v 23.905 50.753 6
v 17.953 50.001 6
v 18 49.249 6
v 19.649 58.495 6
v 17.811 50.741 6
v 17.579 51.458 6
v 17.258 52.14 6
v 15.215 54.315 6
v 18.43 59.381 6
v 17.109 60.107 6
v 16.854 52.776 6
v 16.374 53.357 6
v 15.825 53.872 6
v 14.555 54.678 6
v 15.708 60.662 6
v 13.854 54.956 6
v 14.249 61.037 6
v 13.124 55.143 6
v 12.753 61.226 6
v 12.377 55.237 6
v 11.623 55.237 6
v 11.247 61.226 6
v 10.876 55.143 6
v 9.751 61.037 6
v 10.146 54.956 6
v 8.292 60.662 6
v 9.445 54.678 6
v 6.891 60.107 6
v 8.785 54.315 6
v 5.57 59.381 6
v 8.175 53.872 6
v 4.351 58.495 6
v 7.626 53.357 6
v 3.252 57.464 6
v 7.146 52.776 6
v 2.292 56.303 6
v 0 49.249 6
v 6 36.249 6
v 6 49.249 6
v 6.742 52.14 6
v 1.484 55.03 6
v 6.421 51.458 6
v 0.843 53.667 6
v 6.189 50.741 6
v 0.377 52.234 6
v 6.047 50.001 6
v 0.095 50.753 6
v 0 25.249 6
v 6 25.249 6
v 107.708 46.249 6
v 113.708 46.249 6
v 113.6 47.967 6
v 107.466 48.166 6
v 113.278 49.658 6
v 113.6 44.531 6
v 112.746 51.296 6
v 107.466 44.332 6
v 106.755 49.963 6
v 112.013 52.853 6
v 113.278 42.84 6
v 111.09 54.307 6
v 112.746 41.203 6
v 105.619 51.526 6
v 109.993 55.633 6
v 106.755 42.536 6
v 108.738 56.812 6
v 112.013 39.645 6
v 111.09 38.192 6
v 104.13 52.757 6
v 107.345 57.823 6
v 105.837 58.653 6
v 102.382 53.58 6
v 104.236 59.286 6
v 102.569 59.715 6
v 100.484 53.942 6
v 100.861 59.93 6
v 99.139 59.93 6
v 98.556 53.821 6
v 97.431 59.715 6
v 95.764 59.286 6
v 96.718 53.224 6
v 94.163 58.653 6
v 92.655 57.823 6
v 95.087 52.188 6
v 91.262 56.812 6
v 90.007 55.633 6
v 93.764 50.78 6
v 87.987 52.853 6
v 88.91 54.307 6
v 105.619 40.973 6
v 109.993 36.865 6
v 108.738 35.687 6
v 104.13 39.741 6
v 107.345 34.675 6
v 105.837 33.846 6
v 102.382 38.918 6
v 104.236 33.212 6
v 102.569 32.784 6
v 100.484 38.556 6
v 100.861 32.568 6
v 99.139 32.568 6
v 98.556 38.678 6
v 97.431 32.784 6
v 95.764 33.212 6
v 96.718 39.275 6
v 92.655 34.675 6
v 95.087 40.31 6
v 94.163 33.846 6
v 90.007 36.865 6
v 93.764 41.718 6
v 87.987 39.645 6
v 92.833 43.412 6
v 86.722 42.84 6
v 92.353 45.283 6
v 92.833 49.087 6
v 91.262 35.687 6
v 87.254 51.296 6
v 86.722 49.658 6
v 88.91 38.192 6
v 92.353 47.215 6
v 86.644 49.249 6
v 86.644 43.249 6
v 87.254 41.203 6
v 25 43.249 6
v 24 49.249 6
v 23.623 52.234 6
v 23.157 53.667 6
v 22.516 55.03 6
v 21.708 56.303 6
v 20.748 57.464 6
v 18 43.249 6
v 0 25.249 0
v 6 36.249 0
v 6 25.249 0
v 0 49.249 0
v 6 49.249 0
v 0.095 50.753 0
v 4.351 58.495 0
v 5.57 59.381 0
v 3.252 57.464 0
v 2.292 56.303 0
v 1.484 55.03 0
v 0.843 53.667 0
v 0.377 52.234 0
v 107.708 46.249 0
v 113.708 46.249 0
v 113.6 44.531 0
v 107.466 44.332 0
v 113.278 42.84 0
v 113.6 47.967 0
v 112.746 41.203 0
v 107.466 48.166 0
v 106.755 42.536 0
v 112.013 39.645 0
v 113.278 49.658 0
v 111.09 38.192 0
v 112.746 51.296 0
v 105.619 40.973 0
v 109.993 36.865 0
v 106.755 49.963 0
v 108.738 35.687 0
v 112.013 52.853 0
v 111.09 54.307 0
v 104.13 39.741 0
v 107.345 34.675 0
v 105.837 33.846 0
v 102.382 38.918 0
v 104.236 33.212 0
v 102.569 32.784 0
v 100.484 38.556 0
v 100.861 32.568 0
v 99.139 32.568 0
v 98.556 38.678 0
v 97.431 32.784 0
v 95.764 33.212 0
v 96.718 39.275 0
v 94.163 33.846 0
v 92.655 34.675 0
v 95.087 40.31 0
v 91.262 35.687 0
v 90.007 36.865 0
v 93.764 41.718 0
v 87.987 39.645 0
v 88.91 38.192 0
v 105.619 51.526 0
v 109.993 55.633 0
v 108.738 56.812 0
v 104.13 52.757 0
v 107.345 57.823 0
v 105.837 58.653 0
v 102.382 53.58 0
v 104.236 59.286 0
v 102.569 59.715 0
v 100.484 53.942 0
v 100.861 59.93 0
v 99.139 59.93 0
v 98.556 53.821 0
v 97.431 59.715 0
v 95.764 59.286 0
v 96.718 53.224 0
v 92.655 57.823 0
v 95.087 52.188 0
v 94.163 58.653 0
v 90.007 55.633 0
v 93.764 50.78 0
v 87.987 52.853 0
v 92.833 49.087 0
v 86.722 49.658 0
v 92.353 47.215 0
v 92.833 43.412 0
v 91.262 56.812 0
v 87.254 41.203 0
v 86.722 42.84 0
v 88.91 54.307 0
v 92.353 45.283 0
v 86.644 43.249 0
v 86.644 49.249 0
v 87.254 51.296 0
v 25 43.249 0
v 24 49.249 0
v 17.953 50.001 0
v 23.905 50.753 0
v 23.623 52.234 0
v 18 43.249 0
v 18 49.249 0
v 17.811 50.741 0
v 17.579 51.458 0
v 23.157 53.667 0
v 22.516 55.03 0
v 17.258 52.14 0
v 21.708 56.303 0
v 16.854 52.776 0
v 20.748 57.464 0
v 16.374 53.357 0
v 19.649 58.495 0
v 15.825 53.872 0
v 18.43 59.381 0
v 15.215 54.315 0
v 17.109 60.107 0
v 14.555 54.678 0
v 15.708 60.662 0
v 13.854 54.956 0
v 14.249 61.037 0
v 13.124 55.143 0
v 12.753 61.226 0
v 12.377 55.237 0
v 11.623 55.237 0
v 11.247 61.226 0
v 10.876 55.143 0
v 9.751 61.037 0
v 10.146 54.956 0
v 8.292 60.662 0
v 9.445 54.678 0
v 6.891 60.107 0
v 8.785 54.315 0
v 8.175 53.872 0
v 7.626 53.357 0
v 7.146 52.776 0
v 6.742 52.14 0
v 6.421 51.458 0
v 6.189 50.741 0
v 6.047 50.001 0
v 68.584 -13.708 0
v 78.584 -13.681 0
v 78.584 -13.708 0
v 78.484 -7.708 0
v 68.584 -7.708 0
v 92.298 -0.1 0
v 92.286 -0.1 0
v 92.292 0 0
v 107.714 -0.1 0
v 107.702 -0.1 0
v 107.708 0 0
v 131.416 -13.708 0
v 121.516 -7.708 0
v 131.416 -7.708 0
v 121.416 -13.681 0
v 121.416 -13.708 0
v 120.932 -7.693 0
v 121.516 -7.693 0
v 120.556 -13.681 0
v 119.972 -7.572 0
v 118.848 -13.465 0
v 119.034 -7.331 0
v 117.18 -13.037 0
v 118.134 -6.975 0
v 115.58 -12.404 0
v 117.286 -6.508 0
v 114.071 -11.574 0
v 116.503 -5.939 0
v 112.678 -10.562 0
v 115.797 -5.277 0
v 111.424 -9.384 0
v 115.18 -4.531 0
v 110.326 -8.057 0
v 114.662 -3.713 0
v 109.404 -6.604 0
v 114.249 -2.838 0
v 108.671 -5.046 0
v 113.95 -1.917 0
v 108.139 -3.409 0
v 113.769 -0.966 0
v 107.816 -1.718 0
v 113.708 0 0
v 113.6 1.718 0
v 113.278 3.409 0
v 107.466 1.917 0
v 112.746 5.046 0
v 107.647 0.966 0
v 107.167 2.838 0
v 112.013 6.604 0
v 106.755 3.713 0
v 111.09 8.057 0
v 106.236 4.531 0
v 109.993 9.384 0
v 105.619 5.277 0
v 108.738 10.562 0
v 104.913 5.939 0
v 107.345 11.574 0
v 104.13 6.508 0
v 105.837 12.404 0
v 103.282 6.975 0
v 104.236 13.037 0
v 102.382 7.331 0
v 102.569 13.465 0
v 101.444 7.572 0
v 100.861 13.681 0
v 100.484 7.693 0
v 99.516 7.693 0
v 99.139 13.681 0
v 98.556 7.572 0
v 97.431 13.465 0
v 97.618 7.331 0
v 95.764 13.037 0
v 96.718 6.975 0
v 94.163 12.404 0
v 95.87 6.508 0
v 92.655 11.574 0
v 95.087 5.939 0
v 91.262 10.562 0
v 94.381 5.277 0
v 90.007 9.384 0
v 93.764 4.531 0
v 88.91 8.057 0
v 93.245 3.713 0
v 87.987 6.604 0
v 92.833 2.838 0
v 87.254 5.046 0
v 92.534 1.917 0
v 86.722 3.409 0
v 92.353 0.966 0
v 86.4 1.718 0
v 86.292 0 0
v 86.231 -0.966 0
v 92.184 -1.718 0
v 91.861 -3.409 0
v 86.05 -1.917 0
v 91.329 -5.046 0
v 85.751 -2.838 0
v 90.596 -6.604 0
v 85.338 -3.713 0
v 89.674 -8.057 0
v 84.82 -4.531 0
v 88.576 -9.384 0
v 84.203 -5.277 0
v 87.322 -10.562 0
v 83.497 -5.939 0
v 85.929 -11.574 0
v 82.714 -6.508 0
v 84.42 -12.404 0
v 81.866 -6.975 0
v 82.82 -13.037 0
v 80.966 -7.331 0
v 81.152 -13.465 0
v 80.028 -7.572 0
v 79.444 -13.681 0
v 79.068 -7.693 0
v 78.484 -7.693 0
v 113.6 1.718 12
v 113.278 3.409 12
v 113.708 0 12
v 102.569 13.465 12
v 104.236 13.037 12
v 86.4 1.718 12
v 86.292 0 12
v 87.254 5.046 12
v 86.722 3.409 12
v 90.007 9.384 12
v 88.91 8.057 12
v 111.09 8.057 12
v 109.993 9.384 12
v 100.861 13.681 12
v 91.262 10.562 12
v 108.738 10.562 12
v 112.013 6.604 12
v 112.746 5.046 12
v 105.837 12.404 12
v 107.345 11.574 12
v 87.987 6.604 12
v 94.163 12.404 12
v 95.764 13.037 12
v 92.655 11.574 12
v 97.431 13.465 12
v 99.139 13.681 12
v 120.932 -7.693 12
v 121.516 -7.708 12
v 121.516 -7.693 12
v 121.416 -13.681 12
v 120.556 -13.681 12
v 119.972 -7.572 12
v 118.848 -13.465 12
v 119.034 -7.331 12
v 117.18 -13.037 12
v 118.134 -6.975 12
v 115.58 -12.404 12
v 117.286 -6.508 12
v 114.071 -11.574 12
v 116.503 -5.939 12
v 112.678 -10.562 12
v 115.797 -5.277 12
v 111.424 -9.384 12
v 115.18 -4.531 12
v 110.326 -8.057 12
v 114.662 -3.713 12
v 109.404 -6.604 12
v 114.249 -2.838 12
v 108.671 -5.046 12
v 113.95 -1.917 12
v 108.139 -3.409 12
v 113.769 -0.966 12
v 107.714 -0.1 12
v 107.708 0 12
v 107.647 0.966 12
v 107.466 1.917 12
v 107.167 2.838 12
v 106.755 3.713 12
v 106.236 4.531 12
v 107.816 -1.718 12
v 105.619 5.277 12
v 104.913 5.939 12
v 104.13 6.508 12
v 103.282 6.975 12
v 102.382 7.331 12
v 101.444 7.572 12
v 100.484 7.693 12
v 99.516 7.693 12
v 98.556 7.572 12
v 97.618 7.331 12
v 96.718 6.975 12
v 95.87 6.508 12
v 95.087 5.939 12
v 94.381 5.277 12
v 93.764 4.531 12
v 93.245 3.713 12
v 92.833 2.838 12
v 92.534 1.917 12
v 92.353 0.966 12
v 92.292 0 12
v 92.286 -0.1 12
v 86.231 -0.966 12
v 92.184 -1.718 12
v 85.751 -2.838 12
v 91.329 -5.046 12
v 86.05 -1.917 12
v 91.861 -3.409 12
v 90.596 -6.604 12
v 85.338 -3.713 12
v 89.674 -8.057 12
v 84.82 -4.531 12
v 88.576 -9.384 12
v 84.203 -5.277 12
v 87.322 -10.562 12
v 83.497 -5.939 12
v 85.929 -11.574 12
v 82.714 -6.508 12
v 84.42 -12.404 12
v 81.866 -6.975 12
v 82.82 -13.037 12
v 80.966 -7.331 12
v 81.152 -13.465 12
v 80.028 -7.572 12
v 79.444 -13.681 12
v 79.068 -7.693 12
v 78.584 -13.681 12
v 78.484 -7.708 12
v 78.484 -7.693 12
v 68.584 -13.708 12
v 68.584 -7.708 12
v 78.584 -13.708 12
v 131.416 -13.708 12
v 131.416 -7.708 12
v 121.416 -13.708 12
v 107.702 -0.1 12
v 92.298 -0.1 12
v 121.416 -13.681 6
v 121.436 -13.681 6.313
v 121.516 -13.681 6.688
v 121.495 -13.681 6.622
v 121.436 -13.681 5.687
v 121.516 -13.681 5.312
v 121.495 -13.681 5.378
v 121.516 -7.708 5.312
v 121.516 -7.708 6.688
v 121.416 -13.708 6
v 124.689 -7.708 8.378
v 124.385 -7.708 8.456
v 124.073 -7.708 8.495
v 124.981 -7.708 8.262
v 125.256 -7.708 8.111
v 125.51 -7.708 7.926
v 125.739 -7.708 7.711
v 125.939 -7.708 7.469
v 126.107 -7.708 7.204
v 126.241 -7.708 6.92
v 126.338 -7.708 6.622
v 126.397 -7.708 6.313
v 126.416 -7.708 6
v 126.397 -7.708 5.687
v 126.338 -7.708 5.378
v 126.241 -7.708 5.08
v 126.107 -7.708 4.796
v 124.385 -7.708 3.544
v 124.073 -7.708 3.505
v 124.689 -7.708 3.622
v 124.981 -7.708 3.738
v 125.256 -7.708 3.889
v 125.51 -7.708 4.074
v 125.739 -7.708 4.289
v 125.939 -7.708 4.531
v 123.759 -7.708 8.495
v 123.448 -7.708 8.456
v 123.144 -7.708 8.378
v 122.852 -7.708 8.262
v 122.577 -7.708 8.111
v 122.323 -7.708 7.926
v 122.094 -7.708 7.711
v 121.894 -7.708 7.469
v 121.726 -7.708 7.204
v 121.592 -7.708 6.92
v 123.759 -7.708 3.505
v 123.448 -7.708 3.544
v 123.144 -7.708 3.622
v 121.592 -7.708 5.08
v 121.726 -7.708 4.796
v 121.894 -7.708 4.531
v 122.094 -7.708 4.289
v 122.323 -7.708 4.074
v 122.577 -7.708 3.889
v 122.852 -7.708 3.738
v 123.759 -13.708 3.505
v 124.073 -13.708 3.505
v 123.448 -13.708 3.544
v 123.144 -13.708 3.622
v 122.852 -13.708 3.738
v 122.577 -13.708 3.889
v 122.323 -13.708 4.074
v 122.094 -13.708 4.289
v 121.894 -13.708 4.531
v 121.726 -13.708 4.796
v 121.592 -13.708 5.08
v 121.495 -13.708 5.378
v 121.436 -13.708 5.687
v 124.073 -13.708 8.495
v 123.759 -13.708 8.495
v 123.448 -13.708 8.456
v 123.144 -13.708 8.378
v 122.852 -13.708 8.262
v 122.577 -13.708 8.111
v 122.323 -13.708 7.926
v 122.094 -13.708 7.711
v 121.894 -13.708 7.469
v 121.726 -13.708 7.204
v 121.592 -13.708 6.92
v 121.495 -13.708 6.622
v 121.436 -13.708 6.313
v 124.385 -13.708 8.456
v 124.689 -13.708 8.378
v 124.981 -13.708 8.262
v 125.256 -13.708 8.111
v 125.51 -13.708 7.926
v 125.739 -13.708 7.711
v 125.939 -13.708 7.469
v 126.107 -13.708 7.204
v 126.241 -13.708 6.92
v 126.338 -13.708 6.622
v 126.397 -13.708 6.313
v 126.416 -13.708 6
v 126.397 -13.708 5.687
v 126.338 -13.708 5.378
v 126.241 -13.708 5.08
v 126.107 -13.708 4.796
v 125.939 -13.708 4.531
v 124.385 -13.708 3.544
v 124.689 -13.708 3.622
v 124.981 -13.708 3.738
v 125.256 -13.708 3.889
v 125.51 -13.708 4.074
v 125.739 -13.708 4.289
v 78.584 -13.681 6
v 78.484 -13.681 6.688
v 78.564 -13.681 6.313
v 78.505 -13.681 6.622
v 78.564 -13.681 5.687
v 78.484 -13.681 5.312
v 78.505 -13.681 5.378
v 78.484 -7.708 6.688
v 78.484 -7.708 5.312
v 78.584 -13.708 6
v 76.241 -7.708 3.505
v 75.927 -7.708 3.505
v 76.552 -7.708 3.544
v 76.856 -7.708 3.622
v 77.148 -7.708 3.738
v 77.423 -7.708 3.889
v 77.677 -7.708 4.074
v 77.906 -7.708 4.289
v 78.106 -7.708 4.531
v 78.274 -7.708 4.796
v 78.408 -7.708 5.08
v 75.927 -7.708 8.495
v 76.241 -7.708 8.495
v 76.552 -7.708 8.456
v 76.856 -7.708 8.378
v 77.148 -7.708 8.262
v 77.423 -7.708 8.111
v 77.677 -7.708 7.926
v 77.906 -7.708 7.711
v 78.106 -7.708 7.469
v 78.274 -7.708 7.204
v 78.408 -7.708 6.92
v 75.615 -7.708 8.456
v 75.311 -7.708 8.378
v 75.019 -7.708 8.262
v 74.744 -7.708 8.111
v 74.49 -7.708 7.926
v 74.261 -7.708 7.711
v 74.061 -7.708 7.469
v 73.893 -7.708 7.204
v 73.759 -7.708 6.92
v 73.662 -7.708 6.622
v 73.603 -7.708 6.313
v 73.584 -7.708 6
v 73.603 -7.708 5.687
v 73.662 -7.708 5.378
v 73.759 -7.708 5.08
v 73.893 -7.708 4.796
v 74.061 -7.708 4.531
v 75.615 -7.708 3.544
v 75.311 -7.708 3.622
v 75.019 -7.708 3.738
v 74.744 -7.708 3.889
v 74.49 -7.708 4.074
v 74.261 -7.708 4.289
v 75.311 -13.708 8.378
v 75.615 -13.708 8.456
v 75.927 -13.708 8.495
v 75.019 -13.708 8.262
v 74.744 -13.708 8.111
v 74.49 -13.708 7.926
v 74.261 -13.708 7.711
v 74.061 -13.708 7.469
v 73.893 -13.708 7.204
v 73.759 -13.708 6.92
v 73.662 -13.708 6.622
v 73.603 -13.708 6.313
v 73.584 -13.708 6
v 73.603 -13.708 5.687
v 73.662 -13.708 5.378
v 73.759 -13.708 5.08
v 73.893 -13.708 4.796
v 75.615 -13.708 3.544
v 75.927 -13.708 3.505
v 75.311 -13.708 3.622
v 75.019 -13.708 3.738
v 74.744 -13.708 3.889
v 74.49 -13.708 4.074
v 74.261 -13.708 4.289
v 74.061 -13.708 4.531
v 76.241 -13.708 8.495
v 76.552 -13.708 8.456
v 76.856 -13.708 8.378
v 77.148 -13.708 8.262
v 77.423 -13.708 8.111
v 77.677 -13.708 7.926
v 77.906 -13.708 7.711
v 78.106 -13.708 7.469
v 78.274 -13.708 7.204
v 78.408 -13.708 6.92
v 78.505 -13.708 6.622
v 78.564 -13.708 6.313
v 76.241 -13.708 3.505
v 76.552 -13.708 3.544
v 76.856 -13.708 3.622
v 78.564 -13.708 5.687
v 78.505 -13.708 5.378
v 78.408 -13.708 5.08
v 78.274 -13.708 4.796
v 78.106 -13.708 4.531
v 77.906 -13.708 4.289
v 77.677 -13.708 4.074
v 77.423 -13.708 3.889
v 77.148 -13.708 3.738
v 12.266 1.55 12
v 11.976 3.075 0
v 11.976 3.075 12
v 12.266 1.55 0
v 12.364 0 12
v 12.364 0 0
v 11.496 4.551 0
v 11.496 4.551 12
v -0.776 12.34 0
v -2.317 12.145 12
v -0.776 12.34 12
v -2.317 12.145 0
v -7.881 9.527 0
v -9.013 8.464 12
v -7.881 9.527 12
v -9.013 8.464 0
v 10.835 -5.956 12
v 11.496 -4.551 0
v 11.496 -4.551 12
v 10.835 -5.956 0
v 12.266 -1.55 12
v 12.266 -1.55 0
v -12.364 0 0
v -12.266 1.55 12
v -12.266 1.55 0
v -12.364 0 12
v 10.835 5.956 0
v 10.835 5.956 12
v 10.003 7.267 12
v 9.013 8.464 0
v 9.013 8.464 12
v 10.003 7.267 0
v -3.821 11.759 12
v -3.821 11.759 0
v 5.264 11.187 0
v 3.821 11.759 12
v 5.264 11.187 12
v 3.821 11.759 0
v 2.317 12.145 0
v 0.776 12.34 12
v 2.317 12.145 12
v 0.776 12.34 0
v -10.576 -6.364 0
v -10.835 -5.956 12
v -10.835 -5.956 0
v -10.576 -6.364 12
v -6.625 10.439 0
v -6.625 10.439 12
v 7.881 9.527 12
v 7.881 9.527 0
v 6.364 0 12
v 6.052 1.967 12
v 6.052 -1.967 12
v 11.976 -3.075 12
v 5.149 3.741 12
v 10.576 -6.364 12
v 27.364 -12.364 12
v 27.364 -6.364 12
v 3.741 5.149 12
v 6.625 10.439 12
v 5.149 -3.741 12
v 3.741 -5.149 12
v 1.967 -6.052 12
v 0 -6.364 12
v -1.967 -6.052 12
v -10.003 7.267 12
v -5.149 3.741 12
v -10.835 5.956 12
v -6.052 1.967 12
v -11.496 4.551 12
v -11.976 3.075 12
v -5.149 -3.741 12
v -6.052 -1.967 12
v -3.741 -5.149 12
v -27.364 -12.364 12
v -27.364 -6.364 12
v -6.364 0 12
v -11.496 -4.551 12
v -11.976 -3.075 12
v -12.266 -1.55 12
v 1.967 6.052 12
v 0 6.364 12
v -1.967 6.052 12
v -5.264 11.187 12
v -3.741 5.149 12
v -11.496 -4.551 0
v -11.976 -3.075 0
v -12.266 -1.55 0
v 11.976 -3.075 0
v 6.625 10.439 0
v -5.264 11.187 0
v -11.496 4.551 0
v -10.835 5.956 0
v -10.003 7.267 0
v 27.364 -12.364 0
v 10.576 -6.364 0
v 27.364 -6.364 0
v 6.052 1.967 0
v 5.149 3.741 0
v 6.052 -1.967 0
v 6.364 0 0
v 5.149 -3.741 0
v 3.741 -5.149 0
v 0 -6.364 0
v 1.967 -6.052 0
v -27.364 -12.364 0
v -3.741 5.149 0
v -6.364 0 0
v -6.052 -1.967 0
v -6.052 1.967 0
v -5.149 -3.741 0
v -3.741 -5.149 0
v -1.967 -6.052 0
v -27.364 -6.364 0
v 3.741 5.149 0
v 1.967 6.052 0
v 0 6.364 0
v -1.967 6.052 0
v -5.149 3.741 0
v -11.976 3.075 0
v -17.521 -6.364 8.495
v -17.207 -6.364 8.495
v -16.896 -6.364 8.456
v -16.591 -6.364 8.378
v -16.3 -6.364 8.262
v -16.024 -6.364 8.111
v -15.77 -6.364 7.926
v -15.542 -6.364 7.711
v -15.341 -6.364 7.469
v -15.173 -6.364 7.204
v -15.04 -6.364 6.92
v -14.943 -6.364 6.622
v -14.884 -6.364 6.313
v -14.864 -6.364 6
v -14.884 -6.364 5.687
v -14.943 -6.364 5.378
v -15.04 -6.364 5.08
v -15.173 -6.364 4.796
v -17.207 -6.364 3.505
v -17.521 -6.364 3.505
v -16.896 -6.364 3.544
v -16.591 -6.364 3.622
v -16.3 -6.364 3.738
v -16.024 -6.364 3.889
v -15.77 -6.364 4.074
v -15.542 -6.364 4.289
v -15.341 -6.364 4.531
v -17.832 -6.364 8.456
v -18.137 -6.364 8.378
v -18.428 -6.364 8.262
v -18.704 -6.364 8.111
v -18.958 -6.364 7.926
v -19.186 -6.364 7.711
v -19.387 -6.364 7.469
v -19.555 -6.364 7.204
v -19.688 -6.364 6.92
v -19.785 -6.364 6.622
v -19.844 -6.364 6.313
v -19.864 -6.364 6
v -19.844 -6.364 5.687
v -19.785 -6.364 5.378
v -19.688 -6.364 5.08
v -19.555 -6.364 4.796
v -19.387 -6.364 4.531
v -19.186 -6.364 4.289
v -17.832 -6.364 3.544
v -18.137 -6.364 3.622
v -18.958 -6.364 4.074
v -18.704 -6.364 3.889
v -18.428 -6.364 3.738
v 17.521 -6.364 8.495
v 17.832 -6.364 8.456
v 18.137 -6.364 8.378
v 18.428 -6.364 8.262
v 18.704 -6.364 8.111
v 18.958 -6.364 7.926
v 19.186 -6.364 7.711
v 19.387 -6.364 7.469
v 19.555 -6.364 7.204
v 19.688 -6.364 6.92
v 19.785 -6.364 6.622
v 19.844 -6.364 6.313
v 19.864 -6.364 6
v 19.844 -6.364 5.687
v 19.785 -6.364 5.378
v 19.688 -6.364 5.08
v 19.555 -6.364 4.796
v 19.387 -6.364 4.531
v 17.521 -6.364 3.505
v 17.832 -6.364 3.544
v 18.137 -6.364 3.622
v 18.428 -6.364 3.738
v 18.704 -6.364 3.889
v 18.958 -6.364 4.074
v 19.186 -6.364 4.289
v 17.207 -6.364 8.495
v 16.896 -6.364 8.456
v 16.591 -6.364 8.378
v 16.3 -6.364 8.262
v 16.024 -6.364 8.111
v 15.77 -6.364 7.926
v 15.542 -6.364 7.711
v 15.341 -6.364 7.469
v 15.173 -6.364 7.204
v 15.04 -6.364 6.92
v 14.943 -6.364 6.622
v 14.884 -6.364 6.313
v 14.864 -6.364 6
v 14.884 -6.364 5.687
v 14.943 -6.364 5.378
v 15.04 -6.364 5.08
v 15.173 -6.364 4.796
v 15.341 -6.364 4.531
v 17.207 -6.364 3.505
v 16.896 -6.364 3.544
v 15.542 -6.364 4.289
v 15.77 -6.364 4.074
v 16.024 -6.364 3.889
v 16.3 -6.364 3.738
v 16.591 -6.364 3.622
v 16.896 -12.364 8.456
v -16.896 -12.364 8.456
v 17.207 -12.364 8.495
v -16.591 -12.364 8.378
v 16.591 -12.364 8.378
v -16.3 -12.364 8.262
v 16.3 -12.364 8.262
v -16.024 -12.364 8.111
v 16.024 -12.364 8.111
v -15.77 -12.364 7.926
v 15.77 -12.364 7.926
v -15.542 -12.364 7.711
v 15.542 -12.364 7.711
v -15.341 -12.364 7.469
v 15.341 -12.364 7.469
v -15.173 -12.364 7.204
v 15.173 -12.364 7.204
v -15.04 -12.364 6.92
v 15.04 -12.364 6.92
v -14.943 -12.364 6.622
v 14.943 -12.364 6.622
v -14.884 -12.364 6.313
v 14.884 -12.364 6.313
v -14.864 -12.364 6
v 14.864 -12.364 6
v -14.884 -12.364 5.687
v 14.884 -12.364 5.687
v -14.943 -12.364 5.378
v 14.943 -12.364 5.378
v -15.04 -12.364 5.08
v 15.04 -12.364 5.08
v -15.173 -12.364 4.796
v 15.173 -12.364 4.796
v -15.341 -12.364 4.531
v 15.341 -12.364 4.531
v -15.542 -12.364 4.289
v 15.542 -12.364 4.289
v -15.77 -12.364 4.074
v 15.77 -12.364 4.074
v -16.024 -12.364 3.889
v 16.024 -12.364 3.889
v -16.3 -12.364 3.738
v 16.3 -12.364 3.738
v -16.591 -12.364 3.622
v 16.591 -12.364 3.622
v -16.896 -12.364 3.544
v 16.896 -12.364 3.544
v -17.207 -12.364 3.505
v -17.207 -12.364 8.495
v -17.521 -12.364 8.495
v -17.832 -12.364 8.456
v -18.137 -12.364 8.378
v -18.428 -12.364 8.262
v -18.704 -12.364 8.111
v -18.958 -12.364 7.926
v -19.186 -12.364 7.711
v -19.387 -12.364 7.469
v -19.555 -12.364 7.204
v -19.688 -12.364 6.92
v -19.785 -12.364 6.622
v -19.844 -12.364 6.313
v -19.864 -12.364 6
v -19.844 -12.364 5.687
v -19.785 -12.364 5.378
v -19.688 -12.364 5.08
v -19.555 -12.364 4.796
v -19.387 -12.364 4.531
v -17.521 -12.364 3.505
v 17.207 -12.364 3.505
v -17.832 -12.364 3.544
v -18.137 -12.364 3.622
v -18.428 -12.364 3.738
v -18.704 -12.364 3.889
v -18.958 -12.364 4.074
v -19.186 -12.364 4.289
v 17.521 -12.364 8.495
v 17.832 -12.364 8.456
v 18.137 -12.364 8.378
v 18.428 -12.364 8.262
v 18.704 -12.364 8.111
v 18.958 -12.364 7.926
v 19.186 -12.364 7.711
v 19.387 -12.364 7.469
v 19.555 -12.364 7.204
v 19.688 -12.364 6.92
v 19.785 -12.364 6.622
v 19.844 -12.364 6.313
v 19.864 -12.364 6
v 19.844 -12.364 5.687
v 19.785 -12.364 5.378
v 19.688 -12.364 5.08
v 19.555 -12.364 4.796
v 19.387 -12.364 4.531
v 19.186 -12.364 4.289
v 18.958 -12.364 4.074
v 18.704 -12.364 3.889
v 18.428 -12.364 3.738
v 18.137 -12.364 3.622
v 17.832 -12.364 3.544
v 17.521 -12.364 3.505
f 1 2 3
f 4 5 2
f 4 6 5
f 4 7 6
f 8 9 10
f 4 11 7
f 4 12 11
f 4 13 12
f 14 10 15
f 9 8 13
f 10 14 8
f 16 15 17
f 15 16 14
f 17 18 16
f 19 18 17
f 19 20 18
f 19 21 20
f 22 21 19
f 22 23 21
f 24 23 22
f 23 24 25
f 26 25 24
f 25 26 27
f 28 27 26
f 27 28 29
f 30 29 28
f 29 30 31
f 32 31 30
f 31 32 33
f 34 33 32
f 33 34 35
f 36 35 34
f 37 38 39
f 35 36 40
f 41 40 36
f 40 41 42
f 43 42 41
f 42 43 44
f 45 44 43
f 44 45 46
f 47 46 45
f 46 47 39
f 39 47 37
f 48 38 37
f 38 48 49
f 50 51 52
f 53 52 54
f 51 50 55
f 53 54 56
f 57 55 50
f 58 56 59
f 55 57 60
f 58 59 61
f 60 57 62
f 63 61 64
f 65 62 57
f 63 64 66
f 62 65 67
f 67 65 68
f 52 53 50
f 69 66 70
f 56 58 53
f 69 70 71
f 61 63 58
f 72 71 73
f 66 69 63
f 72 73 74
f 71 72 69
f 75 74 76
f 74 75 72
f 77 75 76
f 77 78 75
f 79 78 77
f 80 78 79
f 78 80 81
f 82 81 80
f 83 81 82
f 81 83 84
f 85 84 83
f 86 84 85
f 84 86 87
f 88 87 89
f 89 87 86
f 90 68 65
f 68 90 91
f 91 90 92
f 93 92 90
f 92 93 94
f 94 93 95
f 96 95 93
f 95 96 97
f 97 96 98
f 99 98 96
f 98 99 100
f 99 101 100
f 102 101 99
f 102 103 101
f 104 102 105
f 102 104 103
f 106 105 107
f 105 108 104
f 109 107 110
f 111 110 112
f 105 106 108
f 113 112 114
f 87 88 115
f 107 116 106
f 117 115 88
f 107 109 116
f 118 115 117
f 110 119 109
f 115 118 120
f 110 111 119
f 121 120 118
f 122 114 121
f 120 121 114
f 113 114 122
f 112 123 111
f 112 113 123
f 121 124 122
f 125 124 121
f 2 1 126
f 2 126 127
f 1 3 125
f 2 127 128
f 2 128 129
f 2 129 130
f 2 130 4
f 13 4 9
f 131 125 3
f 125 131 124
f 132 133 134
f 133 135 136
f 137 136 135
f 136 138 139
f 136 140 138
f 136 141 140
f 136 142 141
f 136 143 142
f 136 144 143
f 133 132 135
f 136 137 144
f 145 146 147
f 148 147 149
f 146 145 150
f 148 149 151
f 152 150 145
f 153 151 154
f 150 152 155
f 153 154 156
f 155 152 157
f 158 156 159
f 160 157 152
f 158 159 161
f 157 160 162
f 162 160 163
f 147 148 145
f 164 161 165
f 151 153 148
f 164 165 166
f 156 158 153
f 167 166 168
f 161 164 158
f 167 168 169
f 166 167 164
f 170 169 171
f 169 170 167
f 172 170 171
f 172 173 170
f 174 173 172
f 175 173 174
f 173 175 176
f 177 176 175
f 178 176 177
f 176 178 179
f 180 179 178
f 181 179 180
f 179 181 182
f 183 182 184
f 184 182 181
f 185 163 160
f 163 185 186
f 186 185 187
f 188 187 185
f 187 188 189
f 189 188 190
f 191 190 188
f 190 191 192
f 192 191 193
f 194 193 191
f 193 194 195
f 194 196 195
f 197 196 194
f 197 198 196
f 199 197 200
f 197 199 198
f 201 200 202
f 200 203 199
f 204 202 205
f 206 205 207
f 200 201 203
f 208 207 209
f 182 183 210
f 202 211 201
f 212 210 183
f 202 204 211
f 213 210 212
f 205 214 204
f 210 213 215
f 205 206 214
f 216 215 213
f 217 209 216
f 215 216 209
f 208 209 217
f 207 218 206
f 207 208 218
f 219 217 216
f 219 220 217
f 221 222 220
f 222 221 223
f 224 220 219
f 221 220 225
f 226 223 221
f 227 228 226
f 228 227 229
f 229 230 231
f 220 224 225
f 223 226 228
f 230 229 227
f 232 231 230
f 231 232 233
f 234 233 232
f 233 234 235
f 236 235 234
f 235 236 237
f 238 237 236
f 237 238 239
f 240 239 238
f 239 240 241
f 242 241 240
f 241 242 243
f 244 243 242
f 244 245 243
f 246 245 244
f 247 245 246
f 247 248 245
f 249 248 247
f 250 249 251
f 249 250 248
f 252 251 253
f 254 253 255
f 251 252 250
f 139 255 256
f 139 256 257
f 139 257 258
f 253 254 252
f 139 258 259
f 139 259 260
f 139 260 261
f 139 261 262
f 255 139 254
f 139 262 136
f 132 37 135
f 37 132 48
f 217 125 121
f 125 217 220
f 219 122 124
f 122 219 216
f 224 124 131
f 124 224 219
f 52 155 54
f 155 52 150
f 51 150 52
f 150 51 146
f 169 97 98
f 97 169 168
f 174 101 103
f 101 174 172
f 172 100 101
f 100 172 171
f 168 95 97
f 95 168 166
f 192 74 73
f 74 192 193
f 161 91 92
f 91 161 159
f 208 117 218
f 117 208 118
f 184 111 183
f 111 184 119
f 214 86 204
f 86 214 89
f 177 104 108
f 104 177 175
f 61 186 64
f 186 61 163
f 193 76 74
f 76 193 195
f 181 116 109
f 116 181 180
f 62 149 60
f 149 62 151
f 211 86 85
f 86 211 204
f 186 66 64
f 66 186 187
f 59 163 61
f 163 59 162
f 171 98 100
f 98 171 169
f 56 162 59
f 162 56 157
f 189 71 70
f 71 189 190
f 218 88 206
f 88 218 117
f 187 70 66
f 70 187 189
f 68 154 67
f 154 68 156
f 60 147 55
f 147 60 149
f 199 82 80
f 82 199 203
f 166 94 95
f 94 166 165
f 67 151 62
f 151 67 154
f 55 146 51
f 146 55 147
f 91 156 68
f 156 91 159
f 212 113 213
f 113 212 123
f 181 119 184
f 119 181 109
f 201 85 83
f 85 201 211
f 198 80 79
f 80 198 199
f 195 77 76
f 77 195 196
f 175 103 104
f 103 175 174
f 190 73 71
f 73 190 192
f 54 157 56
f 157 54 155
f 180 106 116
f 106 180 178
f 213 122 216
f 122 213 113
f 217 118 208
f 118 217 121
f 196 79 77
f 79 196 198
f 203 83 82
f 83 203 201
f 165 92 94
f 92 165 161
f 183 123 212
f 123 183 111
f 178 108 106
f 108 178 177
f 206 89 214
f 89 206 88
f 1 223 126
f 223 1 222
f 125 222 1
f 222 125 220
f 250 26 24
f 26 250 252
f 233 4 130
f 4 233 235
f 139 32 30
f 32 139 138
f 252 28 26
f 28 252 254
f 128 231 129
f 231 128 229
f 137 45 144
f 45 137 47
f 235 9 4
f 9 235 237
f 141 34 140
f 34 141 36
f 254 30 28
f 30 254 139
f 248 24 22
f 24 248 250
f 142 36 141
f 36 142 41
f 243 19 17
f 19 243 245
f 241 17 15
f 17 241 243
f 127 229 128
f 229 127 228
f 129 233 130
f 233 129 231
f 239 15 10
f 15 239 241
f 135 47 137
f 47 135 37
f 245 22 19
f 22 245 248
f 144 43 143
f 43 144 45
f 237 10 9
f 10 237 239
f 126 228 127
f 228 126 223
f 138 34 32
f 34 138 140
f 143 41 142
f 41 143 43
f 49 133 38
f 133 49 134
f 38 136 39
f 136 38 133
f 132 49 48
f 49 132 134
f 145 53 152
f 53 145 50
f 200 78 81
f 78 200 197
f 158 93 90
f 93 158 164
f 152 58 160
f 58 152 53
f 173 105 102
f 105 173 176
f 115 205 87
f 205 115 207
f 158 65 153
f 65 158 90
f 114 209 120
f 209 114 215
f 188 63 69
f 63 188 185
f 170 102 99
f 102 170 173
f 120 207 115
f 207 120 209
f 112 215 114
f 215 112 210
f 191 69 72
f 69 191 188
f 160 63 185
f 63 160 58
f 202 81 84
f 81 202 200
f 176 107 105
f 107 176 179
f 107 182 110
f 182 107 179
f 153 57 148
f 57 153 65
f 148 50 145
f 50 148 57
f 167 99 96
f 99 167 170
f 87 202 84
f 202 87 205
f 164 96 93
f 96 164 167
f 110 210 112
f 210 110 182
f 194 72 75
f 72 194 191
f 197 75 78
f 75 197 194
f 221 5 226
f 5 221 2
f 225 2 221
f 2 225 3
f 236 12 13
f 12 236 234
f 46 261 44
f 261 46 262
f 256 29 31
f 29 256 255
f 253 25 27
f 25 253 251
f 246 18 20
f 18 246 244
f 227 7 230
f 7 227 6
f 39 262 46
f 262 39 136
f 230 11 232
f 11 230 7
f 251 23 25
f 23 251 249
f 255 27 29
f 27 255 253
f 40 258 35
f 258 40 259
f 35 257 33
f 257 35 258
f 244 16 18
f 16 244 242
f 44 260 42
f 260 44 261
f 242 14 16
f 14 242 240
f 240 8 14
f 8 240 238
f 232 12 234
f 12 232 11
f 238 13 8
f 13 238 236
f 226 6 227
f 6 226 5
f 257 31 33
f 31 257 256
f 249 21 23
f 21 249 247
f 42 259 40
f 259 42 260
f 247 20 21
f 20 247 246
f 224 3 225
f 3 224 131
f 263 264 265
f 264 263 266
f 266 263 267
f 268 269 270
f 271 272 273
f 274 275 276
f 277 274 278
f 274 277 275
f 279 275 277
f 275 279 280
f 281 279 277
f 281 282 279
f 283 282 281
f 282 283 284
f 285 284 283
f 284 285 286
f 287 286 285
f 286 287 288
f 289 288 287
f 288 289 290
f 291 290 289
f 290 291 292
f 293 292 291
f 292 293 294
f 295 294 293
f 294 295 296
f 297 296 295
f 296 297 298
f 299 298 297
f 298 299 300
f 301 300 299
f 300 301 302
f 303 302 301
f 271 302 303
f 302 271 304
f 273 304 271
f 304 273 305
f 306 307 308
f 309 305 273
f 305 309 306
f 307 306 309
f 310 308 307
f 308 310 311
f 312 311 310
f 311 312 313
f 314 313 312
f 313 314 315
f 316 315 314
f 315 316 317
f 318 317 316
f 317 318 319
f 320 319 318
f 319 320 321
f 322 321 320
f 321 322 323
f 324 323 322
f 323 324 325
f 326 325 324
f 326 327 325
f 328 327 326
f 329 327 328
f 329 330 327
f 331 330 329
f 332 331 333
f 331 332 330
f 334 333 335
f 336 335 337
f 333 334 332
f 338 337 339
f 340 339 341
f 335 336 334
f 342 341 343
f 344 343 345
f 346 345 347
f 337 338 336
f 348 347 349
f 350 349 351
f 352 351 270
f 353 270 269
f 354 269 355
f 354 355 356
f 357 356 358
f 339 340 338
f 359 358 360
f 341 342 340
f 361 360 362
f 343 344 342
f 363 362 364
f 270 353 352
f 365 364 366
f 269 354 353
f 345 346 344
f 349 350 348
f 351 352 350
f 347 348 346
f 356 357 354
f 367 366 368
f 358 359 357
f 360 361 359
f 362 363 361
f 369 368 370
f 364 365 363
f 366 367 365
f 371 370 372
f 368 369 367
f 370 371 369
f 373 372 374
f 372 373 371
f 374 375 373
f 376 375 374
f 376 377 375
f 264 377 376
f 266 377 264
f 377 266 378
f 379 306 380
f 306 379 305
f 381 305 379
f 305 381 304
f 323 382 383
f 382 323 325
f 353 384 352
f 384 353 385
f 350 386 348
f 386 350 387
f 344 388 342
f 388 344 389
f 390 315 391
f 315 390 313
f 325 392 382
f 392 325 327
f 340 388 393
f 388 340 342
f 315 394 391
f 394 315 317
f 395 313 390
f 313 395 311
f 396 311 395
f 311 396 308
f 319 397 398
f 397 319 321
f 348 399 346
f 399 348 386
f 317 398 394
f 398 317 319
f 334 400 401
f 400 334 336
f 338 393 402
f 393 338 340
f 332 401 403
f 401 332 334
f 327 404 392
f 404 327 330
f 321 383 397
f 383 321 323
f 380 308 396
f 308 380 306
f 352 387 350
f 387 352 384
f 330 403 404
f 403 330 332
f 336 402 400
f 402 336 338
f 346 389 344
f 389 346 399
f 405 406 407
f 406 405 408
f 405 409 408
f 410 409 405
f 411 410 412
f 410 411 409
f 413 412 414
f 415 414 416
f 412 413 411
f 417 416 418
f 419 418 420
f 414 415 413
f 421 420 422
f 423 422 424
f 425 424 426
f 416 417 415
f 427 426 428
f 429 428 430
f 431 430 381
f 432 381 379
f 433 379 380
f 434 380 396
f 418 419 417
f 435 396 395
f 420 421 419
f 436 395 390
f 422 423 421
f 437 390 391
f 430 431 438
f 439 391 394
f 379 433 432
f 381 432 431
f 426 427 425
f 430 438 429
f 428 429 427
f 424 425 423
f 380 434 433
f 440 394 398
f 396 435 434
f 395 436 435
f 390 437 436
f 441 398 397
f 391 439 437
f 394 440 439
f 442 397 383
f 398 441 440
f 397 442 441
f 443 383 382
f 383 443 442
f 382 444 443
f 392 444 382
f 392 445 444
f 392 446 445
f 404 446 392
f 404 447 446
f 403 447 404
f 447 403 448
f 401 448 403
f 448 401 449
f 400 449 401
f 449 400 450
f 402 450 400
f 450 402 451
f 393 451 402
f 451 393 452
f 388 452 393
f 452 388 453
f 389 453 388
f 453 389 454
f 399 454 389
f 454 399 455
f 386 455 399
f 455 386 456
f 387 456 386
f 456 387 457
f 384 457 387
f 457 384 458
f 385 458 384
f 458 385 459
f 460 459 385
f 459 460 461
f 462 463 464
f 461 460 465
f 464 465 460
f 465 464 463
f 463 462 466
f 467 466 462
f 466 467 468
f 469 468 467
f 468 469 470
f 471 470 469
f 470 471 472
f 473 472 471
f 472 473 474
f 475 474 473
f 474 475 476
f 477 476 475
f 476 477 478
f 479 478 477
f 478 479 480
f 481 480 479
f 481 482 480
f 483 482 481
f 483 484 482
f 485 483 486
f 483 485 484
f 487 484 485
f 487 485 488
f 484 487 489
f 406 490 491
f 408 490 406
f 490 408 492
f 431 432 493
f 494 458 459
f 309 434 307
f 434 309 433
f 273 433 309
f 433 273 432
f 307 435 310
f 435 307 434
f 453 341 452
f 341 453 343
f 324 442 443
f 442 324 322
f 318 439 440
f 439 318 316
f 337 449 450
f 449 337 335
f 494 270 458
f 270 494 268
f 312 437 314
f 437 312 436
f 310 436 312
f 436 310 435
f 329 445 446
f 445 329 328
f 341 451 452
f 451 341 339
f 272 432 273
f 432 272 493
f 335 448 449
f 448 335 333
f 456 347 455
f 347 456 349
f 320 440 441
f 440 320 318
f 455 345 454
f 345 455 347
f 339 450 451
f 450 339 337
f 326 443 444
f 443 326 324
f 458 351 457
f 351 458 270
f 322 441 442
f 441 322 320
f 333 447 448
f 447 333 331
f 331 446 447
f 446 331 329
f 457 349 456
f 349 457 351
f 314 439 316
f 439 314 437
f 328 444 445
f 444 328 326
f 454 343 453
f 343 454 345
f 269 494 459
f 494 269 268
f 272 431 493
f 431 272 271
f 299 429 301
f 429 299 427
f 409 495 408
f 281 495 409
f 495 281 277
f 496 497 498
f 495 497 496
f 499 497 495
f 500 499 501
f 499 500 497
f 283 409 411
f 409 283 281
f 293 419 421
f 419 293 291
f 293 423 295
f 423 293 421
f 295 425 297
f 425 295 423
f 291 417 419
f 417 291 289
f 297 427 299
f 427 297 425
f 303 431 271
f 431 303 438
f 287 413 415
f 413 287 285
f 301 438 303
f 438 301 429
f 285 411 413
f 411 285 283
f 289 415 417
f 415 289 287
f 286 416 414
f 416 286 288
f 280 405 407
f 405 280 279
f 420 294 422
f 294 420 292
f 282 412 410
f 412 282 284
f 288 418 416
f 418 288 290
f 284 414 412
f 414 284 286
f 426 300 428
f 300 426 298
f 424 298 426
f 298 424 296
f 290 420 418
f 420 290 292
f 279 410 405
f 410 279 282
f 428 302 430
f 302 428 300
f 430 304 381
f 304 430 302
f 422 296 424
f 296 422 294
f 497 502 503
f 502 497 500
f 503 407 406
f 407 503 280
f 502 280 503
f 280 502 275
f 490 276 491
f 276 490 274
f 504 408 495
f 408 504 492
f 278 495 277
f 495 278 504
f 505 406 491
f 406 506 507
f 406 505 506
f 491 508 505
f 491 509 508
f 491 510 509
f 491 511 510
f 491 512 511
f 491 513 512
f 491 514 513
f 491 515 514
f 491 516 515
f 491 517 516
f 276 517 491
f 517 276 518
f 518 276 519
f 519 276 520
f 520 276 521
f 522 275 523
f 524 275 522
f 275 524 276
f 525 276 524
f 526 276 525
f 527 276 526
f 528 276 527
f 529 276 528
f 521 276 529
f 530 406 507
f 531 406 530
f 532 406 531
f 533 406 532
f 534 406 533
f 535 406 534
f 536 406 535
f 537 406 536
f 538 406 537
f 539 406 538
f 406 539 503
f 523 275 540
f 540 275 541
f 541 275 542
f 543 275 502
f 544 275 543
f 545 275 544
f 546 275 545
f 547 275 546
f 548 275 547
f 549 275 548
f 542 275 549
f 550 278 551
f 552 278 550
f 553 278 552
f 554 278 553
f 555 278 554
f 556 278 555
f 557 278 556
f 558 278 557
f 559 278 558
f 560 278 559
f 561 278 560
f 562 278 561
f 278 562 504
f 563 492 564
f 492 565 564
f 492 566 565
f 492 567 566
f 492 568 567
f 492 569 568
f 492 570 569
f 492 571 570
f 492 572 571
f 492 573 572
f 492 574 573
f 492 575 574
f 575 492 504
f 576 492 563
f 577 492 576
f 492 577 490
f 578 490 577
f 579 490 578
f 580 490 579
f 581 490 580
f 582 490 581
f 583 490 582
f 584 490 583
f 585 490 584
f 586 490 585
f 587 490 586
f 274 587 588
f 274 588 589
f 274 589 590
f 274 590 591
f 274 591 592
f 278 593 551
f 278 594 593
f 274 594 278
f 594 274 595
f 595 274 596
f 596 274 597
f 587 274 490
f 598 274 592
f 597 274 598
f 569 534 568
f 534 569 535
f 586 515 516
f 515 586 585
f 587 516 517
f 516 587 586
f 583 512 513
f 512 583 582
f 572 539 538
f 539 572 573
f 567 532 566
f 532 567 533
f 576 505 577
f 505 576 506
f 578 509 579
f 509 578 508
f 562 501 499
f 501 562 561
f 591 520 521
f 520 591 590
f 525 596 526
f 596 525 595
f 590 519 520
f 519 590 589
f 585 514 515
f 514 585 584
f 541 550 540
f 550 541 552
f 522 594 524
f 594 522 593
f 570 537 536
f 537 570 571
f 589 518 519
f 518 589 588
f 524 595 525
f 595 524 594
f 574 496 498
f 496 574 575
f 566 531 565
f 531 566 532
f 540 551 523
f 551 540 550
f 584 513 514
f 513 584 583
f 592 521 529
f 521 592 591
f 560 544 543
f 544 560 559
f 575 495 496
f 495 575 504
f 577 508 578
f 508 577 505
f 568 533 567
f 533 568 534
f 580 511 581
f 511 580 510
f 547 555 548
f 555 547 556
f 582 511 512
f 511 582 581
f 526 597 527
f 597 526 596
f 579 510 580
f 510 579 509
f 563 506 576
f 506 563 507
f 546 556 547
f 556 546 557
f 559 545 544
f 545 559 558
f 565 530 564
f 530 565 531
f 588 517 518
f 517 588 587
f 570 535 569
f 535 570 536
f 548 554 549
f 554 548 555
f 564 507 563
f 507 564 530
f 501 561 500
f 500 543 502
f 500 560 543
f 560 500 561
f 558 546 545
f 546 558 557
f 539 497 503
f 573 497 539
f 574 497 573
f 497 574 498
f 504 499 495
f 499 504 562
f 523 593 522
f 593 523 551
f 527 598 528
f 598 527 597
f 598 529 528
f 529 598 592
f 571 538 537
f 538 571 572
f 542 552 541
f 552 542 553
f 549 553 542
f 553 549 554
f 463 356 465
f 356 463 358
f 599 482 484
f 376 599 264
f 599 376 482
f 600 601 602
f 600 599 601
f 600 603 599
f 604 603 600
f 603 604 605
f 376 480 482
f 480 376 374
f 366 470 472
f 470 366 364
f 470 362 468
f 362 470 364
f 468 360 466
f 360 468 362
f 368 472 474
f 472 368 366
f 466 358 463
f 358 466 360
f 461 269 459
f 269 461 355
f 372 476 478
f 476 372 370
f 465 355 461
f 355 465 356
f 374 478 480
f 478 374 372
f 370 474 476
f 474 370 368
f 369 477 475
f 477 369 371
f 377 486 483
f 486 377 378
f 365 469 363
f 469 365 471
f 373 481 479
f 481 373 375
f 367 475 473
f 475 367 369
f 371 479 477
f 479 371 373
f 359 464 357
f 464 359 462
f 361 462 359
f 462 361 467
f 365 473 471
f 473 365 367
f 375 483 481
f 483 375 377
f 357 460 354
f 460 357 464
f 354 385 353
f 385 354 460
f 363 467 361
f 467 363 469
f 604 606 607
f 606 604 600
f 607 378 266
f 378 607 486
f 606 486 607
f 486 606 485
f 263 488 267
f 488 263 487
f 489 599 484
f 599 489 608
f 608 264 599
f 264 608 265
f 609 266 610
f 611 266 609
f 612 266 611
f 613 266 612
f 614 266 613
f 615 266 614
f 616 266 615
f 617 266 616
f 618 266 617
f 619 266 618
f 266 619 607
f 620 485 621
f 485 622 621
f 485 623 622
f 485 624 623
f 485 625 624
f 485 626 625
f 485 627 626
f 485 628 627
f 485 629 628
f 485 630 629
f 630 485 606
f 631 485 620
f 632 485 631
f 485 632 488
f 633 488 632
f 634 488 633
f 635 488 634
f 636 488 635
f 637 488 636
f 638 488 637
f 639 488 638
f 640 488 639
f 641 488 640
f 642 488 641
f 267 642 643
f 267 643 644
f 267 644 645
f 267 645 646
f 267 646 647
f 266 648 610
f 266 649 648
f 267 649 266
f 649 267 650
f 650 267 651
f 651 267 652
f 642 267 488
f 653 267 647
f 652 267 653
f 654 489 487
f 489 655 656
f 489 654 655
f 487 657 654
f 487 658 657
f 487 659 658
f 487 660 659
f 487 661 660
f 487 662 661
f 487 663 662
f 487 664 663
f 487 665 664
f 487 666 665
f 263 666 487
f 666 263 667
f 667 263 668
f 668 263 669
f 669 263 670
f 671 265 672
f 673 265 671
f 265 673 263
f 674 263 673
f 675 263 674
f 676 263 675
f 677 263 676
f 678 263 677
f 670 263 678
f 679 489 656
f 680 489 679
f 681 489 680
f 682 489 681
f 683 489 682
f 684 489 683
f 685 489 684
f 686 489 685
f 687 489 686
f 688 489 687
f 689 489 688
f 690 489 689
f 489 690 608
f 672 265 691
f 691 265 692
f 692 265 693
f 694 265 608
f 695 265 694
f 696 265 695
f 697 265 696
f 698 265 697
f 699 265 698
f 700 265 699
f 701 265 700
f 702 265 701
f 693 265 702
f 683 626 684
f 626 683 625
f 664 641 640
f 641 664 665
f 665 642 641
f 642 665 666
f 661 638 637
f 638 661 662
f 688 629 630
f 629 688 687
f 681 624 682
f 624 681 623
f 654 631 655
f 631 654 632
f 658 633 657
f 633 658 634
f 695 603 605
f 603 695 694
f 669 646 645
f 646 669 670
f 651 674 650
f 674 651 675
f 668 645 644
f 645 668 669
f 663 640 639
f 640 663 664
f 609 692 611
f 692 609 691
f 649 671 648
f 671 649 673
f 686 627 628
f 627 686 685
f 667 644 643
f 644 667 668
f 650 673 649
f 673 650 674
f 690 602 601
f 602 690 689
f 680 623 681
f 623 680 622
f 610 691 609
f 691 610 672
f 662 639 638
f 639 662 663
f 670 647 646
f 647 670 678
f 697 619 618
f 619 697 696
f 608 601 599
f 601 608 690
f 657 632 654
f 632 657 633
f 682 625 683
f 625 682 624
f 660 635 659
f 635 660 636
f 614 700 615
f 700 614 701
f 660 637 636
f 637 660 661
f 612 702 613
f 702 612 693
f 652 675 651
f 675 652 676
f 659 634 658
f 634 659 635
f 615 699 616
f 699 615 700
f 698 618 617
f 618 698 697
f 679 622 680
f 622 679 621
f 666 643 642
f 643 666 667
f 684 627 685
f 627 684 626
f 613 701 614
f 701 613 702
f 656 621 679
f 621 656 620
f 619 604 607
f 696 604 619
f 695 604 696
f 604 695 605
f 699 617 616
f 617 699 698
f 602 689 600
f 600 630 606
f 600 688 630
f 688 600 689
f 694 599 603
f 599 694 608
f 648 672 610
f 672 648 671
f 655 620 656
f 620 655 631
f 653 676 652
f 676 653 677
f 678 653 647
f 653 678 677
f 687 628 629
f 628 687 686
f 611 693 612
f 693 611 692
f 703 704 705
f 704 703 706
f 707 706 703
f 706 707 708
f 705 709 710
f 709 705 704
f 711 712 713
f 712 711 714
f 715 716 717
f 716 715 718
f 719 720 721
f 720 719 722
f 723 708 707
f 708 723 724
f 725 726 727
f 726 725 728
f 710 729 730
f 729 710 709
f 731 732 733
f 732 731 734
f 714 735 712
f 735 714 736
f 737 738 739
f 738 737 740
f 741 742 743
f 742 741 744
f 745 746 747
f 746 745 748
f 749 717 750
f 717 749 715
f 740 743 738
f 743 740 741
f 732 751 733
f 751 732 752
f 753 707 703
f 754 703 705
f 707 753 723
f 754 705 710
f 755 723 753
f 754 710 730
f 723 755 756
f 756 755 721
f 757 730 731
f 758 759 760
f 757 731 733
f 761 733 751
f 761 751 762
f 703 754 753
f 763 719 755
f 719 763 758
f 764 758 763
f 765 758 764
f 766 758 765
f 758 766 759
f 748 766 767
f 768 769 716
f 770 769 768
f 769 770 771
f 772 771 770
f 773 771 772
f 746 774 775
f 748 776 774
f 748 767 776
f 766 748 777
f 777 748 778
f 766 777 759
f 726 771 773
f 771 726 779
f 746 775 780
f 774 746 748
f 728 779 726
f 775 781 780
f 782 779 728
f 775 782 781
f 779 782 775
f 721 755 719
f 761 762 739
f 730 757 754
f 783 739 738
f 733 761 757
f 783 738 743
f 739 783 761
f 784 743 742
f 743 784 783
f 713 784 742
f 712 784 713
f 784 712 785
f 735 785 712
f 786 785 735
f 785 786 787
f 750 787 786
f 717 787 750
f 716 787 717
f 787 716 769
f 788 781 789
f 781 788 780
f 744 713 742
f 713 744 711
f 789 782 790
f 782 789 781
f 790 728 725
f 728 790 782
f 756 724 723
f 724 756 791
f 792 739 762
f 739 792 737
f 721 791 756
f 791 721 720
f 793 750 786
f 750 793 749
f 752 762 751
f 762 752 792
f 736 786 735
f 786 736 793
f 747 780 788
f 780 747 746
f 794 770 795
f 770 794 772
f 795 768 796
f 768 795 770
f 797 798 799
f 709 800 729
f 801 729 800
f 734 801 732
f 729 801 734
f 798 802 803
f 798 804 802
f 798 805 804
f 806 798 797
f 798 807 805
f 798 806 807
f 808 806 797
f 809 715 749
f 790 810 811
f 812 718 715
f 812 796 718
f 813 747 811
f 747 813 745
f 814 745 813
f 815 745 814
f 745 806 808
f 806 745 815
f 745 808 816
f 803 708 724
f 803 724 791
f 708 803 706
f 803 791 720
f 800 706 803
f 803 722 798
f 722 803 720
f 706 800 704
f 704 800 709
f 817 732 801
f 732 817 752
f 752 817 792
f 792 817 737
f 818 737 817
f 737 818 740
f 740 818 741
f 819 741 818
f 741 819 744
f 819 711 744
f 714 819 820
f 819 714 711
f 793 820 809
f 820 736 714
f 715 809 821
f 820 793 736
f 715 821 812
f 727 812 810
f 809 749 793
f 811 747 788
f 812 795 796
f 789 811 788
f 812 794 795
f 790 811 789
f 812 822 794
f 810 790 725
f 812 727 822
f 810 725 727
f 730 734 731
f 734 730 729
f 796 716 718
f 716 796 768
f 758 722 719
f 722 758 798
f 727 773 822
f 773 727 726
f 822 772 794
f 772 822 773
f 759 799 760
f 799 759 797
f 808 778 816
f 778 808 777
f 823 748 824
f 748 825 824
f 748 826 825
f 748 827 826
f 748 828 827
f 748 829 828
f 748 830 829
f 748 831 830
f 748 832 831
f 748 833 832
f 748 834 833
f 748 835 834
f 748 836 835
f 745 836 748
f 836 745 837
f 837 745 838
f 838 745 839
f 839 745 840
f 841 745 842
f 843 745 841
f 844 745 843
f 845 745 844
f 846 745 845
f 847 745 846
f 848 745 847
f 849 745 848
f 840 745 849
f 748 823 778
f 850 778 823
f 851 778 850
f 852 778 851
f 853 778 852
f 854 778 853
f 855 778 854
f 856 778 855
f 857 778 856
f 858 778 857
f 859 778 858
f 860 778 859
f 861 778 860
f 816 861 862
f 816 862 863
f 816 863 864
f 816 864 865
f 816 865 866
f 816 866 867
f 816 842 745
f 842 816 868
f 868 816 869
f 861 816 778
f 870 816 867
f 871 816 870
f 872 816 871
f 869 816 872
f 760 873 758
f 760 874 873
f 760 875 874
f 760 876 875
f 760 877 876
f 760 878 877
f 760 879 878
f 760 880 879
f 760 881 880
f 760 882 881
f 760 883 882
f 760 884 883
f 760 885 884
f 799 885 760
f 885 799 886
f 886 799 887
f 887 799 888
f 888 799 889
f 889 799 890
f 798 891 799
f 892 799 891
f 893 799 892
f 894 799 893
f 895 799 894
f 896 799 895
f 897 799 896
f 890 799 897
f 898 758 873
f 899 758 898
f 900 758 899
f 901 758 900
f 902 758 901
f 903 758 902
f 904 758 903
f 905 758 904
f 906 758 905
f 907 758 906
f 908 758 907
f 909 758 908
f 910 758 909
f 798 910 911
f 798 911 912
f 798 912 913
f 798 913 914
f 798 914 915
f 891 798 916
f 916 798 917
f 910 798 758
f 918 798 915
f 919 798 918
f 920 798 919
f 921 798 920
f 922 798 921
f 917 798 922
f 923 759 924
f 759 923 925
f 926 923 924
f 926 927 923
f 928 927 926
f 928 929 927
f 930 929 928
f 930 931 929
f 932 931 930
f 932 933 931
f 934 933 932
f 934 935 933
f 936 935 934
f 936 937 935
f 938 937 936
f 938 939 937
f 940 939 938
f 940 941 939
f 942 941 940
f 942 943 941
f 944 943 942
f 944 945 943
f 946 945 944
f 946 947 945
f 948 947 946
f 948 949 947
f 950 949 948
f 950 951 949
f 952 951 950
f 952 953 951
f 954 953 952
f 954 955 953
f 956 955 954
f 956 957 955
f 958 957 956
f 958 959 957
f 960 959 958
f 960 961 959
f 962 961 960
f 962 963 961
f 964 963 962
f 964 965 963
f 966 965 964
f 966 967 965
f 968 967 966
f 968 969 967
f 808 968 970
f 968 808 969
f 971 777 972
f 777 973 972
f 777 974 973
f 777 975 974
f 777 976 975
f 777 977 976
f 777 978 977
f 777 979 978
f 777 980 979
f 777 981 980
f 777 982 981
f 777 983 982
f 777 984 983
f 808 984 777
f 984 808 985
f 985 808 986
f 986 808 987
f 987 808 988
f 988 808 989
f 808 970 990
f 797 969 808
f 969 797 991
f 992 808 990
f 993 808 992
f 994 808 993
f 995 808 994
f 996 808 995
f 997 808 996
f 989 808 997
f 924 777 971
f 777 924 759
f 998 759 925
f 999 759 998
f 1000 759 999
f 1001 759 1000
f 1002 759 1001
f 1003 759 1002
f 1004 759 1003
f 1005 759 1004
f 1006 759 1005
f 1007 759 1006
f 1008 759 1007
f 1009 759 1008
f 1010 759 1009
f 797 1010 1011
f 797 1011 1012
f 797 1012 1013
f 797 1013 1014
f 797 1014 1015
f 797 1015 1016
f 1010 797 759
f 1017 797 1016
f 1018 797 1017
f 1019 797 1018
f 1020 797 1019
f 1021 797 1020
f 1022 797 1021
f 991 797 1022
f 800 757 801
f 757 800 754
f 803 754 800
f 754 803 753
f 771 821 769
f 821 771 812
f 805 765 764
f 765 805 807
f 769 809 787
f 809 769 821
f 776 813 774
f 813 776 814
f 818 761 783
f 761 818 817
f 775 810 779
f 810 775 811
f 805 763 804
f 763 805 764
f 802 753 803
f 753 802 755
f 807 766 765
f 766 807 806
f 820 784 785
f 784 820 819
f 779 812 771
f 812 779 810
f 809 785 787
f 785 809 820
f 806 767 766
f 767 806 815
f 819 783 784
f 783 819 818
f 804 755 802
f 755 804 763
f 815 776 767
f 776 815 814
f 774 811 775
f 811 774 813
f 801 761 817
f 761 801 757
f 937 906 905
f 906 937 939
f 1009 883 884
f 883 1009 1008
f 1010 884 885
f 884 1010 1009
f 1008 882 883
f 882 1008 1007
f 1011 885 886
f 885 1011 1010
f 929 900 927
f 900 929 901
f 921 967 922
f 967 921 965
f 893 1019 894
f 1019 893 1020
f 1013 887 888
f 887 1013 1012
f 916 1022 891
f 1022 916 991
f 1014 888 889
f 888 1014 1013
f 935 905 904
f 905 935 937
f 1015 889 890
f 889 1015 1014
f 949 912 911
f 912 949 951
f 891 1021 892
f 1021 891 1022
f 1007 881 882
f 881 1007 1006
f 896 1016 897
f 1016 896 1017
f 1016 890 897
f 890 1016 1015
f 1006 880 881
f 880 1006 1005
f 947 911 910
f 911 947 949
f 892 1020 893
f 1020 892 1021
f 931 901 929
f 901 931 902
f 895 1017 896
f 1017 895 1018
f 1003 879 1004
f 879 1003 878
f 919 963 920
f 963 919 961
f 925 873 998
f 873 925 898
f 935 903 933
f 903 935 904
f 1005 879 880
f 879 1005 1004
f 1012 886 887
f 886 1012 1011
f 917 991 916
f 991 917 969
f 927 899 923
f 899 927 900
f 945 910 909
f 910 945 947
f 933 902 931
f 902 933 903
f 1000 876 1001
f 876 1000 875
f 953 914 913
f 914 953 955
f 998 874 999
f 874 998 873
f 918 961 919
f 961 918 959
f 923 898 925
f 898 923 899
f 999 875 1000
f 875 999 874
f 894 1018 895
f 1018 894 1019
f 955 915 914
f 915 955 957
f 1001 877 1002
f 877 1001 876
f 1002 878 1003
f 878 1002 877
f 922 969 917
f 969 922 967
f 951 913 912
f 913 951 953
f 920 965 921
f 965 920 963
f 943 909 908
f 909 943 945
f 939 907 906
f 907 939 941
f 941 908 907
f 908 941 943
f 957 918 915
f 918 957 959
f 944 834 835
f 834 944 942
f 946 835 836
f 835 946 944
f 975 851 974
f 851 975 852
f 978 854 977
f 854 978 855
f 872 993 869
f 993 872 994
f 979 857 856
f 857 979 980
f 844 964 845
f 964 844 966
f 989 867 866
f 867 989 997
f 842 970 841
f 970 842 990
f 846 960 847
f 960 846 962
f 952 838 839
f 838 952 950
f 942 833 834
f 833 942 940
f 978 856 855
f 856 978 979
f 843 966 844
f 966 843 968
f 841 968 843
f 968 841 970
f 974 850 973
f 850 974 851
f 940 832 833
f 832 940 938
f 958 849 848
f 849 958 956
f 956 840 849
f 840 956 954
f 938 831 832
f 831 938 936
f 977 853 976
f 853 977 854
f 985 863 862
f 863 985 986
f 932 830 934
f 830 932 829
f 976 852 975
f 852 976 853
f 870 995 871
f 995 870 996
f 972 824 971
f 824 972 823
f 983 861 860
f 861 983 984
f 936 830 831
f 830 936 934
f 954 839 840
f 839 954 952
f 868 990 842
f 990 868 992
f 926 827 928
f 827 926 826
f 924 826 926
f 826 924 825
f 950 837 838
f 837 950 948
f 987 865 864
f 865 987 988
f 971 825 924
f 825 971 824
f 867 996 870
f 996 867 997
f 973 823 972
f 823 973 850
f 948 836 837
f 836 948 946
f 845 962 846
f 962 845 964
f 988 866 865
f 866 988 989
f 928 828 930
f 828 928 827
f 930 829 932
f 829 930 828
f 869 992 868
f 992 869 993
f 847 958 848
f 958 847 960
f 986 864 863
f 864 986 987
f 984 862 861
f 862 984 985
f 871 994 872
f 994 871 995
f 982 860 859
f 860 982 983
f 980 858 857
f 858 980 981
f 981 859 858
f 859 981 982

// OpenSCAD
// Hasp for fix doors, square section.
// Hasp with
G=6;
// Lenth
L=100;
// Diametre of the holes of wall fix
D=5;

// Alto de las piezas de Sujeccion

H=2.4*D;

// Diametro de las taladro interior de la aldabilla.
D2=2+sqrt((G*G)+(H*H));

// Modelado del cuerpo ppal:

// Creacion del solido envolente del modelo y posterior eliminación de los huecos
translate ([0,3*D2,0])
difference(){
// Fusion de los componentes del cuerpo ppal:
union(){
//Varilla de aldabilla
translate([0,-G/2,0])
    cube([L,G,G]);
// Aro de cogida a puerta
translate ([L,0,0])
    cylinder(h=G,d=(D2+2*G),$fn=50);
// Aro de enganche en pared
translate([2*G,G/2,0])
    cylinder (h=G,d=4*G,$fn=50);
// Prolongacion de Sujeccion a Pared
translate([0,-(G+3*D),0])
    cube ([G,G+3*D,G]);
}

// Partes a eliminar para dejar la pieza lista

// Taladro de anclaje a puerta
translate([L,0,-1])    
    cylinder(h=G+2,d=D2);
// Taladro de anclaje a pared
translate([2*G,G/2,-1])
    cylinder(h=G+2,d=2*G,$fn=50);
// Parte inferior del anclaje a la pared
translate([G,-3*G/2-1,-1])
    cube([2*G,2*G+1,G+2]);
// Pestaña
translate([3*G-1,-G*1.5,-1])
    cube([G+2,G,G+2]);
}

// Pieza de fijación a Puerta:
translate([L,0,0])
union(){
// Arco central:

difference(){
cylinder(h=H,d=D2+2*G,$fn=50);
    
translate ([0,0,-1])
    cylinder(h=H+2,d=D2,$fn=50);
translate([0,-(D2+G)/2-1.1,H/2])
    cube([D2+2*G+2,D2+G+2,H+2], center=true);
}
// Arco lateral Derecho
difference(){
 translate([D2+G,0,0])
    cylinder(h=H,d=D2+2*G,$fn=50);   
 translate([D2+G,0,-1])
    cylinder(h=H+2,d=D2,$fn=50);
 translate([0,0,-1])
    cube([D2*2+2*G+2,D2+G+2,H+2]);
 translate([D2+G+.1,-D2/2-G-2,-1])
    cube([D2+G+2,D2+D+2,H+2]);
}
// Patilla Derecha
difference(){
translate([D2+G,-D2/2-G,0])
    cube([D*2,G,H]);
translate([D2+G+D/2,-D2/2+1,H/2])
rotate([90,0,0])
cylinder(h=G+2,d=D,$fn=50);
}    
 // Arco lateral Izquierdo

mirror([1,0,0]){
difference(){
 translate([D2+G,0,0])
    cylinder(h=H,d=D2+2*G,$fn=50);   
 translate([D2+G,0,-1])
    cylinder(h=H+2,d=D2,$fn=50);
 translate([0,0,-1])
    cube([D2*2+2*G+2,D2+G+2,H+2]);
 translate([D2+G+.1,-D2/2-G-2,-1])
    cube([D2+G+2,D2+D+2,H+2]);
}
// Patilla izquierda
difference(){
translate([D2+G,-D2/2-G,0])
    cube([D*2,G,H]);
translate([D2+G+D/2,-D2/2+1,H/2])
rotate([90,0,0])
cylinder(h=G+2,d=D,$fn=50);
}    

}
}

// Pieza de cierre de la aldabilla:

//Diametro interior de la pieza de sujeccion
D3=1.5*G*sqrt(2);
// Eliminacion de huecos
difference(){
// Cuerpo base
union(){
cylinder(h=H,d=D3+2*G,$fn=50);
translate([0,-G/2-D3/2,H/2])
    cube([D3+2*G+6*D,G,H],center=true);

}
translate([0,0,-1])
    cylinder(h=H+2,d=D3);
translate([D3/2+G+D,-D3/2+1,H/2])
rotate([90,0,0])
    cylinder(h=G+2,d=D,$fn=50);
translate([-D3/2-G-D,-D3/2+1,H/2])
rotate([90,0,0])
    cylinder(h=G+2,d=D,$fn=50);
}
